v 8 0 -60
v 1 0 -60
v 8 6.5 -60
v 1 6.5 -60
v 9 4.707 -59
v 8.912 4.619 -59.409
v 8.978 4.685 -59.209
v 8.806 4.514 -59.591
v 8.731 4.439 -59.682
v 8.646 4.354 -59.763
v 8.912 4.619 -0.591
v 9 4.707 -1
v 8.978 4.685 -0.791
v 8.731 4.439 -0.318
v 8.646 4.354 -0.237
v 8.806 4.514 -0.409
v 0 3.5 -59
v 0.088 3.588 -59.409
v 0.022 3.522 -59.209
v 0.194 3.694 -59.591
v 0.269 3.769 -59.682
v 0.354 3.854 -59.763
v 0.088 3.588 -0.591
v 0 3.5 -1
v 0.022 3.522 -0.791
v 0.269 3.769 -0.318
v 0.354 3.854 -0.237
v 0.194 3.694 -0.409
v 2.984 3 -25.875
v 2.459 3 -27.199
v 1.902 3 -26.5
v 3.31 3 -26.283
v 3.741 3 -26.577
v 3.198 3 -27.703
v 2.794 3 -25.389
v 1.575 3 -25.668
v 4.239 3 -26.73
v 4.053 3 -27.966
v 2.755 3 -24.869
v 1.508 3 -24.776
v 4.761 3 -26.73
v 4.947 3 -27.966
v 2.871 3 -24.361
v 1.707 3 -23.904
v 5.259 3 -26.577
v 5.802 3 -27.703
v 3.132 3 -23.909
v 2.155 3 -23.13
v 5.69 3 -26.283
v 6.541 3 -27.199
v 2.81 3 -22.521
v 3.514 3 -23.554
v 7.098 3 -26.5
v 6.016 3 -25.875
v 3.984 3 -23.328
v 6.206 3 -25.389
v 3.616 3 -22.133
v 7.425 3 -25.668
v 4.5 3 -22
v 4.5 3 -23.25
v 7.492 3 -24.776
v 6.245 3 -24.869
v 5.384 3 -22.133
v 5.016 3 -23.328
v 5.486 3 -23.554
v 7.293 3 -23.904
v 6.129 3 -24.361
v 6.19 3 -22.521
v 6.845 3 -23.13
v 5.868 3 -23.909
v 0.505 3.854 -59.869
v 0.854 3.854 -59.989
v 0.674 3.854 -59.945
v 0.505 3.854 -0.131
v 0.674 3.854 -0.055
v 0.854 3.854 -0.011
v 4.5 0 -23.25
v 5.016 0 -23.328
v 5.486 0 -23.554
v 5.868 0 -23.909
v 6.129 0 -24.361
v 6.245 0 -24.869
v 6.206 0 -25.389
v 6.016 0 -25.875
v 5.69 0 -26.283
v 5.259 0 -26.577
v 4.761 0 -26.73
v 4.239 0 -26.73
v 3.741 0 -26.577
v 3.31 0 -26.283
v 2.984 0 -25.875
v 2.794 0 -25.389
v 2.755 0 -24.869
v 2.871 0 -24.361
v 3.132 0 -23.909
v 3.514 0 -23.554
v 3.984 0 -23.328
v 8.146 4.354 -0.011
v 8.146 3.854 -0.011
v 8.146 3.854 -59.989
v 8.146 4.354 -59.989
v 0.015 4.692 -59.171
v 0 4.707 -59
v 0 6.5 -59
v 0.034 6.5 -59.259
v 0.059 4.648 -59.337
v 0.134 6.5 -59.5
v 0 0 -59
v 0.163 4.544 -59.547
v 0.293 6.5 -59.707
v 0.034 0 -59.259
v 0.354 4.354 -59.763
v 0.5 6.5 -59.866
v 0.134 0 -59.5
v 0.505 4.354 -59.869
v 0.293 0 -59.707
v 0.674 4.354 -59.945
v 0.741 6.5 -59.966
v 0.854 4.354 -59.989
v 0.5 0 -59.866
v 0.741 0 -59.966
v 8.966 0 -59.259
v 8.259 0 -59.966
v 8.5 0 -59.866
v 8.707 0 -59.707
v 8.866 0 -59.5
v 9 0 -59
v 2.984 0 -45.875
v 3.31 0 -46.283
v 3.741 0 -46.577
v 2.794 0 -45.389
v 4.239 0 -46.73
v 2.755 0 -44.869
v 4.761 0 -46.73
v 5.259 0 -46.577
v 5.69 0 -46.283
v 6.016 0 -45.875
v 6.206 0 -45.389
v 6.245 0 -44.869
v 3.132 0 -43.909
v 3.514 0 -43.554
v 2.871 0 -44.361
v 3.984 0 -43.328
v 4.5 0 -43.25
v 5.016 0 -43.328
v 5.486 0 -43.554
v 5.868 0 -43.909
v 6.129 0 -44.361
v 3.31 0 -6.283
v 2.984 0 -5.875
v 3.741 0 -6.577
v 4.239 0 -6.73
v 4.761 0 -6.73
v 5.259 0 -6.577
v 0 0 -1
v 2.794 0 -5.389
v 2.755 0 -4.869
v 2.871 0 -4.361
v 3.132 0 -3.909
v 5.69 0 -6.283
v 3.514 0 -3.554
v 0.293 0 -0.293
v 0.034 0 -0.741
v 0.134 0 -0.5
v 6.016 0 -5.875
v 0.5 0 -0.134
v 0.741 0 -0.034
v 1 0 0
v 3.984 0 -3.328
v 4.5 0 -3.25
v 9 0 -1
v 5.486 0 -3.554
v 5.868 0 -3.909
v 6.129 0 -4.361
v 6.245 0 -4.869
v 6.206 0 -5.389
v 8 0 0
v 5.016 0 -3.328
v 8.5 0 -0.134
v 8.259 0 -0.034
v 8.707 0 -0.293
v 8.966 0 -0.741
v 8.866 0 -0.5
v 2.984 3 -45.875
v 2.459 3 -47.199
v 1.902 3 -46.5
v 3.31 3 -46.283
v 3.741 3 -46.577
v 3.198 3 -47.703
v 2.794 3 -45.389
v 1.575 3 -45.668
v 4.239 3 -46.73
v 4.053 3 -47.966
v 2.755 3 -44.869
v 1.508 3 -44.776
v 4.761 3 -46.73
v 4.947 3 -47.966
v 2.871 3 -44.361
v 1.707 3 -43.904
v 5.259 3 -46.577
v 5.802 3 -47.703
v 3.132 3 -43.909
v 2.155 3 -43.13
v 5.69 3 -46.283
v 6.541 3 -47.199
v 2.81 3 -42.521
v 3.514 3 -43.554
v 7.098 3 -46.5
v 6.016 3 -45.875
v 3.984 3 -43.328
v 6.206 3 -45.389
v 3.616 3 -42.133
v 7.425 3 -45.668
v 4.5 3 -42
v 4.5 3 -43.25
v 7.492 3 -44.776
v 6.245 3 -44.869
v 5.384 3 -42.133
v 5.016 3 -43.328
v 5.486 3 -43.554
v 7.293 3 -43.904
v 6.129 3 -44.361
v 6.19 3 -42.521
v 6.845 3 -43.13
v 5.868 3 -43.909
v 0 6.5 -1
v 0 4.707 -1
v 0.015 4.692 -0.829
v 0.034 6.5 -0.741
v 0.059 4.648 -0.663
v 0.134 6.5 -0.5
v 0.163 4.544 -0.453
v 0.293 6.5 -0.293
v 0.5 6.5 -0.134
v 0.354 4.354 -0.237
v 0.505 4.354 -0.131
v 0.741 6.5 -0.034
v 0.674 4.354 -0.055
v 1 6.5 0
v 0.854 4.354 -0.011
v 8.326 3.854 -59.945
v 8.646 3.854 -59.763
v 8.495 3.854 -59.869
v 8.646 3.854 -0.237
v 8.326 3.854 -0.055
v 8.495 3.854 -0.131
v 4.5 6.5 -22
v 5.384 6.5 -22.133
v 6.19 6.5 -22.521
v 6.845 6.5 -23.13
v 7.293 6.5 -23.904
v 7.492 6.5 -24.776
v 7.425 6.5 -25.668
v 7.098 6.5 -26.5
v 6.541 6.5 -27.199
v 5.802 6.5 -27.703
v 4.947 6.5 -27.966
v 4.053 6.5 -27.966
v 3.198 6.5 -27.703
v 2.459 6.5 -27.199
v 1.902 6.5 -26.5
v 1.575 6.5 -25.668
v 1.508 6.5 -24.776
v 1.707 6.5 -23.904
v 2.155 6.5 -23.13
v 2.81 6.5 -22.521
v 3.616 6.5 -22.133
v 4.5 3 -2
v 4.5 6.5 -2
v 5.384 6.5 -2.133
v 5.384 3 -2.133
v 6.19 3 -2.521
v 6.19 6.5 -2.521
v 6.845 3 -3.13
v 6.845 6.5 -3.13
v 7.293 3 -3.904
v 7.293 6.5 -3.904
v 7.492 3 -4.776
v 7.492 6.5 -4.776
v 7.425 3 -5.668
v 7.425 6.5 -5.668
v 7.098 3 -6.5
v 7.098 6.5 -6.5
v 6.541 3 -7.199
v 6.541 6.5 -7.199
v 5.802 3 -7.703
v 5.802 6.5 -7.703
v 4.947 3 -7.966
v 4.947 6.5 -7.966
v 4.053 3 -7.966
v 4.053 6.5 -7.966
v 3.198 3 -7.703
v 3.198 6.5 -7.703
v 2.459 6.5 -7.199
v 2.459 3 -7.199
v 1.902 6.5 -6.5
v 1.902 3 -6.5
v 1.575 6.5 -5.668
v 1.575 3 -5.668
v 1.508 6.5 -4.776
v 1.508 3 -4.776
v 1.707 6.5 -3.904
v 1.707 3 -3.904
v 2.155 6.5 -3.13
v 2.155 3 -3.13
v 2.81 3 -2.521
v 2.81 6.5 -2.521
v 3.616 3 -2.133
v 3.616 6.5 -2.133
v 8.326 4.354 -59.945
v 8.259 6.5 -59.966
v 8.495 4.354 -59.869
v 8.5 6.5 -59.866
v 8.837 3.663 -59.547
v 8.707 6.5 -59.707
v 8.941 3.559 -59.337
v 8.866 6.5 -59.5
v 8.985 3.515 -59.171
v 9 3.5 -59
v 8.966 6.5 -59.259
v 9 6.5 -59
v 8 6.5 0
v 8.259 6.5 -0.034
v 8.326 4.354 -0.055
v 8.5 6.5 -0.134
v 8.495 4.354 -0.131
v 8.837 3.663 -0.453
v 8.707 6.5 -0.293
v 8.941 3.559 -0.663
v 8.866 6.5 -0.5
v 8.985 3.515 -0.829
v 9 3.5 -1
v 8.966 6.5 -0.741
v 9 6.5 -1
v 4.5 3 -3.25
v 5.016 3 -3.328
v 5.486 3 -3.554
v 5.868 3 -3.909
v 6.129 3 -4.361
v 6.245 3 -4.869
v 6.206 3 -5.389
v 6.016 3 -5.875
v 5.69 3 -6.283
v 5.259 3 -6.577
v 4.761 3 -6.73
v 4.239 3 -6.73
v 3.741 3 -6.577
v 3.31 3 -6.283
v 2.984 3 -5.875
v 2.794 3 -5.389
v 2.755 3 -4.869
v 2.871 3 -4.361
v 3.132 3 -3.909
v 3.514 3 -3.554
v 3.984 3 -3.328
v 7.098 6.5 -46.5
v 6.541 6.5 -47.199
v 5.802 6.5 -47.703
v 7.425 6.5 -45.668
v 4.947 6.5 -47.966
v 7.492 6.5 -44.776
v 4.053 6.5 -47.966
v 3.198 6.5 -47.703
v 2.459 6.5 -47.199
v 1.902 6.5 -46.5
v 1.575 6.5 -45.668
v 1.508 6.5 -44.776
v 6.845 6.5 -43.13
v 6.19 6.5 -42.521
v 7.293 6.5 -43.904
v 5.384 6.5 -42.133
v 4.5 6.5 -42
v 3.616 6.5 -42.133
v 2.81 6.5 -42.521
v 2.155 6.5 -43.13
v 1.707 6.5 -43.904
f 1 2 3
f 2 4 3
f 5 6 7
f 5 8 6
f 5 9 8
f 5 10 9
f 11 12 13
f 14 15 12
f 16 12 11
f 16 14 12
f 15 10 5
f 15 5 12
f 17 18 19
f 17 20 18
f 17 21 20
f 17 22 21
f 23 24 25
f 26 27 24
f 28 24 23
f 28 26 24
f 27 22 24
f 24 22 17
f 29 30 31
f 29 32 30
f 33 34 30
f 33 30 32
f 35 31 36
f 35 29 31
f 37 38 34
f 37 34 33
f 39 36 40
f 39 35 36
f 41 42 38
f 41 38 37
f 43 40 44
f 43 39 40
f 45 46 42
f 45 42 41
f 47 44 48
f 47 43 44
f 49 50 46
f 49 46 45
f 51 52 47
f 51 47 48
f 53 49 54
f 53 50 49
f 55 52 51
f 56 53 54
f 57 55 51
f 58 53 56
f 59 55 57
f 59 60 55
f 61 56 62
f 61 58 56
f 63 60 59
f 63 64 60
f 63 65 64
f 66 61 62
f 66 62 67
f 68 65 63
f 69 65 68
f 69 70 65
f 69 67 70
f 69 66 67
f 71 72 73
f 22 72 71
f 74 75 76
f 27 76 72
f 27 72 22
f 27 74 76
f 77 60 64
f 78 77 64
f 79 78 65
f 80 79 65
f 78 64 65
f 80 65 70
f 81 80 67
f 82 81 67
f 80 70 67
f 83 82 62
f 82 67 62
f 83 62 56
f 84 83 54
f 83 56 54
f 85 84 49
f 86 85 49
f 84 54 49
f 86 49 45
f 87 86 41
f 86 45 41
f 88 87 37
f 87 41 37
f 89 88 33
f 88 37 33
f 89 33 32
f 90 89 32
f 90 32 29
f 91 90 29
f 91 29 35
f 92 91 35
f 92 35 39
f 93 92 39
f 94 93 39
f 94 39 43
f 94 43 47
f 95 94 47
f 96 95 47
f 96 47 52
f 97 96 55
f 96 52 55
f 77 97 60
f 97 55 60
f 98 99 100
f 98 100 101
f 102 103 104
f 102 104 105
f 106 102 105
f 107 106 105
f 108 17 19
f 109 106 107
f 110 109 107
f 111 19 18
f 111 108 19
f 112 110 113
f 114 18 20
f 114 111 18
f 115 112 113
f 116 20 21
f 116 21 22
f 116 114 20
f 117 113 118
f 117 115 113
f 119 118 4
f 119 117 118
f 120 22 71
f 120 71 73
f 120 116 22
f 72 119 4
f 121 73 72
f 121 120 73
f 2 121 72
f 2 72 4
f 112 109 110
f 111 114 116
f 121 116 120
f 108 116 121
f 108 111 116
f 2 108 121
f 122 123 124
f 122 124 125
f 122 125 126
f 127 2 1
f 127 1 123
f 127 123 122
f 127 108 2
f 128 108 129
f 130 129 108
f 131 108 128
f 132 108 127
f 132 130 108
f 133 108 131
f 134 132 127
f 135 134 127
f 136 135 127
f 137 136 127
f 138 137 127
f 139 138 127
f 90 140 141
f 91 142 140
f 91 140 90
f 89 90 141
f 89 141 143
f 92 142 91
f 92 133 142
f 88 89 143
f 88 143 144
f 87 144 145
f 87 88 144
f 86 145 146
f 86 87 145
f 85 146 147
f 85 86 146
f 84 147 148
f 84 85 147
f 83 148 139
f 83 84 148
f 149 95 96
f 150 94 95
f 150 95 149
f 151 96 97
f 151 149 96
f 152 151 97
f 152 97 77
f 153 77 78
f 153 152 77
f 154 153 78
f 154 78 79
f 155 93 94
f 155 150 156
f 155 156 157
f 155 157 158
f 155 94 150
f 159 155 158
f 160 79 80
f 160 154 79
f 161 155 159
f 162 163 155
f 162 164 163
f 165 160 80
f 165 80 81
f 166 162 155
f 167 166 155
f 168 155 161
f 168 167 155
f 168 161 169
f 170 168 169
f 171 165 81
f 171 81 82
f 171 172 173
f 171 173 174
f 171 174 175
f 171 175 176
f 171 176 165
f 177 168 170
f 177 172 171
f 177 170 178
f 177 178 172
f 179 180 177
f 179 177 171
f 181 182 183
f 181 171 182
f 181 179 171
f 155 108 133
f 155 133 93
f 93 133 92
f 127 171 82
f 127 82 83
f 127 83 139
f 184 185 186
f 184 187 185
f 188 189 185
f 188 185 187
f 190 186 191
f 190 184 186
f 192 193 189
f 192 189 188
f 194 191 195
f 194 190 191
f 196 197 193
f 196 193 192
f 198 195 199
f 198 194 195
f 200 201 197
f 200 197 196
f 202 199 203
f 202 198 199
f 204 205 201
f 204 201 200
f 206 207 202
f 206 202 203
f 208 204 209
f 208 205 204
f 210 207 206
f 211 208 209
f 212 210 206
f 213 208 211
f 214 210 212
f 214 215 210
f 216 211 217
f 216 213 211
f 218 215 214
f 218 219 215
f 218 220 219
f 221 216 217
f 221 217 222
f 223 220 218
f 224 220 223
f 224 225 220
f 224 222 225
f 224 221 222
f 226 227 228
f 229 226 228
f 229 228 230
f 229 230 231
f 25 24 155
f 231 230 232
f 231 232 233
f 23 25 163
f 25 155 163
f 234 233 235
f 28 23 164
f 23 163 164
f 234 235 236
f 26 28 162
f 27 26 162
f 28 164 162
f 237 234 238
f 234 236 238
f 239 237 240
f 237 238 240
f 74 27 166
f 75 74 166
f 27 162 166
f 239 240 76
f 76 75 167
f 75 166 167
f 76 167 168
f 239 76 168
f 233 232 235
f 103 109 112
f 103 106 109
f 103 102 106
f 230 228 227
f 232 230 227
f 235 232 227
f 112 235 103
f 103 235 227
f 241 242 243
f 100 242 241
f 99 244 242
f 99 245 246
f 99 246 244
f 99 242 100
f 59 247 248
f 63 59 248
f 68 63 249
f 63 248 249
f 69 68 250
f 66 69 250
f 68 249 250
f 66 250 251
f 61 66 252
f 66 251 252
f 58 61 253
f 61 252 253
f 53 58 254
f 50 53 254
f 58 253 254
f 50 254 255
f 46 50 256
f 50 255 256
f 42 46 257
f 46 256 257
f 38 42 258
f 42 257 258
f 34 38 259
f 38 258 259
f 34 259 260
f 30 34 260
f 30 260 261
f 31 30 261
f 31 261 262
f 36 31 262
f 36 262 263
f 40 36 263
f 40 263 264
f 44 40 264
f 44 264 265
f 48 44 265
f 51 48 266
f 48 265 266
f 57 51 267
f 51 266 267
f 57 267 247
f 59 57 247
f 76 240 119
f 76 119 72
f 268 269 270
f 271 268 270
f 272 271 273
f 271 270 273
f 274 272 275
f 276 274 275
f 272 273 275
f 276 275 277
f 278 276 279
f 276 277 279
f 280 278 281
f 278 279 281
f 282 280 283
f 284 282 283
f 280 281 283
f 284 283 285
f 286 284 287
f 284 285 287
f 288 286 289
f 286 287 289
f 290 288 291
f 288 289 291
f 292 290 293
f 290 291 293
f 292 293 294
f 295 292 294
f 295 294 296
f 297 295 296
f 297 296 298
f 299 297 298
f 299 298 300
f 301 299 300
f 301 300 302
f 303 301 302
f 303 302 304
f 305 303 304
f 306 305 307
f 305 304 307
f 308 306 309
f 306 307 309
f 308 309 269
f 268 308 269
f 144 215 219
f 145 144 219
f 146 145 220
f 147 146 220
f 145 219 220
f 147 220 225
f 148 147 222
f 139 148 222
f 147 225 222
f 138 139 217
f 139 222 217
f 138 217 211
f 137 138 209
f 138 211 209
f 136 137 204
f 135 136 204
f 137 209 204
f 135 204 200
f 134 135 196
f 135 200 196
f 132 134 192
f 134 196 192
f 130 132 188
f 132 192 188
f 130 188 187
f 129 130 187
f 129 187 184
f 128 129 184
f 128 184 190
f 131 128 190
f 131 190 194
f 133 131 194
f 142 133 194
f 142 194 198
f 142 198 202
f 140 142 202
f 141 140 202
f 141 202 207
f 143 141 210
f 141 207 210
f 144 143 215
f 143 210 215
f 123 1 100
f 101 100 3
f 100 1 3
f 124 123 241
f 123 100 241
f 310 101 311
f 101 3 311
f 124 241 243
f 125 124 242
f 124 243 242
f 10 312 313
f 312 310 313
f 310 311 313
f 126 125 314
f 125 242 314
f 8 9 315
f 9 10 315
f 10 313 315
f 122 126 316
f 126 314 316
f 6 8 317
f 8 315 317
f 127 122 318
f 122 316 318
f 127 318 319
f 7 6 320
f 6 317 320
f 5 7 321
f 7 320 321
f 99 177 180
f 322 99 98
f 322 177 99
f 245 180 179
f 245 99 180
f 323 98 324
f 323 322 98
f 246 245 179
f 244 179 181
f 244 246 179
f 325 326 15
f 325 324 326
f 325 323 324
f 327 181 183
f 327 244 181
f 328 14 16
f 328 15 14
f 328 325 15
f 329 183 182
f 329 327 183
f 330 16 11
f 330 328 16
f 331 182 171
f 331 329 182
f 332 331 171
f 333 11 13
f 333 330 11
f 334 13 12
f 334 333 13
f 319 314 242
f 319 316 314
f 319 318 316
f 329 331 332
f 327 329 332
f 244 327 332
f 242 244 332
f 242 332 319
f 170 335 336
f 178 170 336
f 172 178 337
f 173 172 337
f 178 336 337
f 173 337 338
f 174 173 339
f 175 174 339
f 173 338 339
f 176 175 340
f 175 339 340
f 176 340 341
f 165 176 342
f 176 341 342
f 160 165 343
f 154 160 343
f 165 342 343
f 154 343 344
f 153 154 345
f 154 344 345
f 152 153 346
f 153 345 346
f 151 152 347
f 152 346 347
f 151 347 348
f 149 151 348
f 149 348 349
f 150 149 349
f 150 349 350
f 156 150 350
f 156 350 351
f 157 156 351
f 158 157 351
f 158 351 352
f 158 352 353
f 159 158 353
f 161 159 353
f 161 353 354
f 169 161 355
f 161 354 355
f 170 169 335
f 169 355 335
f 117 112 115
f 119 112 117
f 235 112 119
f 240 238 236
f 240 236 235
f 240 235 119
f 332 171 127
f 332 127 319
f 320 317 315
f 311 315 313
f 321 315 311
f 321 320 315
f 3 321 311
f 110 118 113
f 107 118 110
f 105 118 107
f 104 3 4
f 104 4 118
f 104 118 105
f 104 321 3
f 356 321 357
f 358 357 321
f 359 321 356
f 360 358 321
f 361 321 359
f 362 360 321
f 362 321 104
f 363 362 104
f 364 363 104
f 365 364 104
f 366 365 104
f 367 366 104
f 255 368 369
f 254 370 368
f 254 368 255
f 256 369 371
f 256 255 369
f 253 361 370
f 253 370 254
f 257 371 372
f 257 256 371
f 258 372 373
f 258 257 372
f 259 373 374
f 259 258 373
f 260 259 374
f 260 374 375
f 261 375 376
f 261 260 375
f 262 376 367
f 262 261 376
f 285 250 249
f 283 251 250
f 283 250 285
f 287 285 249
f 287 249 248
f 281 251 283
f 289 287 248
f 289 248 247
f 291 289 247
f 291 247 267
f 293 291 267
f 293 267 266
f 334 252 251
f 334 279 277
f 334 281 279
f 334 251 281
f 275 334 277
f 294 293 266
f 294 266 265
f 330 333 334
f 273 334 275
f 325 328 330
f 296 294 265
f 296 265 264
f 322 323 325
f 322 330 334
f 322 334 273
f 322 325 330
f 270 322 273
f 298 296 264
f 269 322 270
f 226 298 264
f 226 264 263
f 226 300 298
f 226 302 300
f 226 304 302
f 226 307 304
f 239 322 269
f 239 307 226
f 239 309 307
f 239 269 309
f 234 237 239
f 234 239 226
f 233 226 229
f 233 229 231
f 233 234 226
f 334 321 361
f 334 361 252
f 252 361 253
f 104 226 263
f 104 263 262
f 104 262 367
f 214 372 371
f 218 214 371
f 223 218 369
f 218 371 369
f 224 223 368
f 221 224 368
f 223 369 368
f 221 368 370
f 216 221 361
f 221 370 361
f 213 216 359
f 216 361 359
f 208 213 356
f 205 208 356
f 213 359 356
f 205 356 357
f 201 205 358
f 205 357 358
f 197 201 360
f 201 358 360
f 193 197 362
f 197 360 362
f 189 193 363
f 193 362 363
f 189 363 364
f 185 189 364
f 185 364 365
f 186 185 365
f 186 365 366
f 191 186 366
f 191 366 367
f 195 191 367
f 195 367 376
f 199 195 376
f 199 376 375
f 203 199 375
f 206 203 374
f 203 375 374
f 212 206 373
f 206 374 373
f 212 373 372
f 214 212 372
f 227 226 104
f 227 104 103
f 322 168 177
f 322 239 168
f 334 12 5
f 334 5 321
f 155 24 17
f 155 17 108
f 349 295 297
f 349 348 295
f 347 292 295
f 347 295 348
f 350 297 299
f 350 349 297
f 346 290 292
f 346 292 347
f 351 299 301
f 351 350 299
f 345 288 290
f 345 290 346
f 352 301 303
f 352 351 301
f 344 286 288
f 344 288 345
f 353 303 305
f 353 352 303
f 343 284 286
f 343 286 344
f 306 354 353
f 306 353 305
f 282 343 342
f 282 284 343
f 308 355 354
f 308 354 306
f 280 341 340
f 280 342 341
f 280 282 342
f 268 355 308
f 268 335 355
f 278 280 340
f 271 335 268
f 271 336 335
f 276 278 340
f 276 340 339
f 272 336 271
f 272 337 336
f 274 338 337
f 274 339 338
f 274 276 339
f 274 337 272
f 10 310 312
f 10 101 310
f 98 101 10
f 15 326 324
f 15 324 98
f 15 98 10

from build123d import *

# Parameters (mm, degrees)
EXTRUDE_2_DEPTH     = 60
SKETCH_3_R          = 3
CUT_EXTRUDE_1_DEPTH = 3.5
SKETCH_4_R          = 1.75
CUT_EXTRUDE_2_DEPTH = 3
FILLET_1_R          = 1


with BuildPart() as part:
    # 草图2 → 凸台-拉伸2 (new body)
    with BuildSketch(Plane.XY):
        Polygon((0, 0), (9, 0), (9, 3.5), (8.646446609, 3.853553391), (8.146446609, 3.853553391), (8.146446609, 4.353553391), (8.646446609, 4.353553391), (9, 4.707106781), (9, 6.5), (0, 6.5), (0, 4.707106781), (0.353553391, 4.353553391), (0.853553391, 4.353553391), (0.853553391, 3.853553391), (0.353553391, 3.853553391), (0, 3.5), align=None)
    extrude(amount=-EXTRUDE_2_DEPTH)

    # 草图3 → 切除-拉伸1 (cut)
    with BuildSketch(Plane(origin=(0, 6.5, 0), x_dir=(1, 0, 0), z_dir=(0, 1, 0))):
        with Locations(Location((4.5, 5, 0), (0, 0, 270))):
            Circle(SKETCH_3_R)
        with Locations(Location((4.5, 25, 0), (0, 0, 270))):
            Circle(SKETCH_3_R)
        with Locations(Location((4.5, 45, 0), (0, 0, 270))):
            Circle(SKETCH_3_R)
        with Locations((4.5, 65)):
            Circle(SKETCH_3_R)
        with Locations((4.5, 85)):
            Circle(SKETCH_3_R)
        with Locations((4.5, 105)):
            Circle(SKETCH_3_R)
        with Locations((4.5, 125)):
            Circle(SKETCH_3_R)
        with Locations((4.5, 145)):
            Circle(SKETCH_3_R)
        with Locations((4.5, 165)):
            Circle(SKETCH_3_R)
        with Locations((4.5, 185)):
            Circle(SKETCH_3_R)
        with Locations((4.5, 205)):
            Circle(SKETCH_3_R)
        with Locations((4.5, 225)):
            Circle(SKETCH_3_R)
    extrude(amount=-CUT_EXTRUDE_1_DEPTH, mode=Mode.SUBTRACT)

    # 草图4 → 切除-拉伸2 (cut)
    with BuildSketch(Plane(origin=(0, 3, 0), x_dir=(1, 0, 0), z_dir=(0, 1, 0))):
        with Locations(Location((4.5, 5, 0), (0, 0, 270))):
            Circle(SKETCH_4_R)
        with Locations(Location((4.5, 25, 0), (0, 0, 270))):
            Circle(SKETCH_4_R)
        with Locations(Location((4.5, 45, 0), (0, 0, 270))):
            Circle(SKETCH_4_R)
        with Locations((4.5, 65)):
            Circle(SKETCH_4_R)
        with Locations((4.5, 85)):
            Circle(SKETCH_4_R)
        with Locations((4.5, 105)):
            Circle(SKETCH_4_R)
        with Locations((4.5, 125)):
            Circle(SKETCH_4_R)
        with Locations((4.5, 145)):
            Circle(SKETCH_4_R)
        with Locations((4.5, 165)):
            Circle(SKETCH_4_R)
        with Locations((4.5, 185)):
            Circle(SKETCH_4_R)
        with Locations((4.5, 205)):
            Circle(SKETCH_4_R)
        with Locations((4.5, 225)):
            Circle(SKETCH_4_R)
    extrude(amount=-CUT_EXTRUDE_2_DEPTH, mode=Mode.SUBTRACT)

    # 圆角1
    fillet_1_edges = [part.edges().sort_by_distance(p)[0] for p in [
        (9, 1.75, -60),
        (0, 1.75, -60),
        (9, 1.75, 0),
        (0, 1.75, 0),
    ]]
    fillet(fillet_1_edges, radius=FILLET_1_R)


solid = part.part
